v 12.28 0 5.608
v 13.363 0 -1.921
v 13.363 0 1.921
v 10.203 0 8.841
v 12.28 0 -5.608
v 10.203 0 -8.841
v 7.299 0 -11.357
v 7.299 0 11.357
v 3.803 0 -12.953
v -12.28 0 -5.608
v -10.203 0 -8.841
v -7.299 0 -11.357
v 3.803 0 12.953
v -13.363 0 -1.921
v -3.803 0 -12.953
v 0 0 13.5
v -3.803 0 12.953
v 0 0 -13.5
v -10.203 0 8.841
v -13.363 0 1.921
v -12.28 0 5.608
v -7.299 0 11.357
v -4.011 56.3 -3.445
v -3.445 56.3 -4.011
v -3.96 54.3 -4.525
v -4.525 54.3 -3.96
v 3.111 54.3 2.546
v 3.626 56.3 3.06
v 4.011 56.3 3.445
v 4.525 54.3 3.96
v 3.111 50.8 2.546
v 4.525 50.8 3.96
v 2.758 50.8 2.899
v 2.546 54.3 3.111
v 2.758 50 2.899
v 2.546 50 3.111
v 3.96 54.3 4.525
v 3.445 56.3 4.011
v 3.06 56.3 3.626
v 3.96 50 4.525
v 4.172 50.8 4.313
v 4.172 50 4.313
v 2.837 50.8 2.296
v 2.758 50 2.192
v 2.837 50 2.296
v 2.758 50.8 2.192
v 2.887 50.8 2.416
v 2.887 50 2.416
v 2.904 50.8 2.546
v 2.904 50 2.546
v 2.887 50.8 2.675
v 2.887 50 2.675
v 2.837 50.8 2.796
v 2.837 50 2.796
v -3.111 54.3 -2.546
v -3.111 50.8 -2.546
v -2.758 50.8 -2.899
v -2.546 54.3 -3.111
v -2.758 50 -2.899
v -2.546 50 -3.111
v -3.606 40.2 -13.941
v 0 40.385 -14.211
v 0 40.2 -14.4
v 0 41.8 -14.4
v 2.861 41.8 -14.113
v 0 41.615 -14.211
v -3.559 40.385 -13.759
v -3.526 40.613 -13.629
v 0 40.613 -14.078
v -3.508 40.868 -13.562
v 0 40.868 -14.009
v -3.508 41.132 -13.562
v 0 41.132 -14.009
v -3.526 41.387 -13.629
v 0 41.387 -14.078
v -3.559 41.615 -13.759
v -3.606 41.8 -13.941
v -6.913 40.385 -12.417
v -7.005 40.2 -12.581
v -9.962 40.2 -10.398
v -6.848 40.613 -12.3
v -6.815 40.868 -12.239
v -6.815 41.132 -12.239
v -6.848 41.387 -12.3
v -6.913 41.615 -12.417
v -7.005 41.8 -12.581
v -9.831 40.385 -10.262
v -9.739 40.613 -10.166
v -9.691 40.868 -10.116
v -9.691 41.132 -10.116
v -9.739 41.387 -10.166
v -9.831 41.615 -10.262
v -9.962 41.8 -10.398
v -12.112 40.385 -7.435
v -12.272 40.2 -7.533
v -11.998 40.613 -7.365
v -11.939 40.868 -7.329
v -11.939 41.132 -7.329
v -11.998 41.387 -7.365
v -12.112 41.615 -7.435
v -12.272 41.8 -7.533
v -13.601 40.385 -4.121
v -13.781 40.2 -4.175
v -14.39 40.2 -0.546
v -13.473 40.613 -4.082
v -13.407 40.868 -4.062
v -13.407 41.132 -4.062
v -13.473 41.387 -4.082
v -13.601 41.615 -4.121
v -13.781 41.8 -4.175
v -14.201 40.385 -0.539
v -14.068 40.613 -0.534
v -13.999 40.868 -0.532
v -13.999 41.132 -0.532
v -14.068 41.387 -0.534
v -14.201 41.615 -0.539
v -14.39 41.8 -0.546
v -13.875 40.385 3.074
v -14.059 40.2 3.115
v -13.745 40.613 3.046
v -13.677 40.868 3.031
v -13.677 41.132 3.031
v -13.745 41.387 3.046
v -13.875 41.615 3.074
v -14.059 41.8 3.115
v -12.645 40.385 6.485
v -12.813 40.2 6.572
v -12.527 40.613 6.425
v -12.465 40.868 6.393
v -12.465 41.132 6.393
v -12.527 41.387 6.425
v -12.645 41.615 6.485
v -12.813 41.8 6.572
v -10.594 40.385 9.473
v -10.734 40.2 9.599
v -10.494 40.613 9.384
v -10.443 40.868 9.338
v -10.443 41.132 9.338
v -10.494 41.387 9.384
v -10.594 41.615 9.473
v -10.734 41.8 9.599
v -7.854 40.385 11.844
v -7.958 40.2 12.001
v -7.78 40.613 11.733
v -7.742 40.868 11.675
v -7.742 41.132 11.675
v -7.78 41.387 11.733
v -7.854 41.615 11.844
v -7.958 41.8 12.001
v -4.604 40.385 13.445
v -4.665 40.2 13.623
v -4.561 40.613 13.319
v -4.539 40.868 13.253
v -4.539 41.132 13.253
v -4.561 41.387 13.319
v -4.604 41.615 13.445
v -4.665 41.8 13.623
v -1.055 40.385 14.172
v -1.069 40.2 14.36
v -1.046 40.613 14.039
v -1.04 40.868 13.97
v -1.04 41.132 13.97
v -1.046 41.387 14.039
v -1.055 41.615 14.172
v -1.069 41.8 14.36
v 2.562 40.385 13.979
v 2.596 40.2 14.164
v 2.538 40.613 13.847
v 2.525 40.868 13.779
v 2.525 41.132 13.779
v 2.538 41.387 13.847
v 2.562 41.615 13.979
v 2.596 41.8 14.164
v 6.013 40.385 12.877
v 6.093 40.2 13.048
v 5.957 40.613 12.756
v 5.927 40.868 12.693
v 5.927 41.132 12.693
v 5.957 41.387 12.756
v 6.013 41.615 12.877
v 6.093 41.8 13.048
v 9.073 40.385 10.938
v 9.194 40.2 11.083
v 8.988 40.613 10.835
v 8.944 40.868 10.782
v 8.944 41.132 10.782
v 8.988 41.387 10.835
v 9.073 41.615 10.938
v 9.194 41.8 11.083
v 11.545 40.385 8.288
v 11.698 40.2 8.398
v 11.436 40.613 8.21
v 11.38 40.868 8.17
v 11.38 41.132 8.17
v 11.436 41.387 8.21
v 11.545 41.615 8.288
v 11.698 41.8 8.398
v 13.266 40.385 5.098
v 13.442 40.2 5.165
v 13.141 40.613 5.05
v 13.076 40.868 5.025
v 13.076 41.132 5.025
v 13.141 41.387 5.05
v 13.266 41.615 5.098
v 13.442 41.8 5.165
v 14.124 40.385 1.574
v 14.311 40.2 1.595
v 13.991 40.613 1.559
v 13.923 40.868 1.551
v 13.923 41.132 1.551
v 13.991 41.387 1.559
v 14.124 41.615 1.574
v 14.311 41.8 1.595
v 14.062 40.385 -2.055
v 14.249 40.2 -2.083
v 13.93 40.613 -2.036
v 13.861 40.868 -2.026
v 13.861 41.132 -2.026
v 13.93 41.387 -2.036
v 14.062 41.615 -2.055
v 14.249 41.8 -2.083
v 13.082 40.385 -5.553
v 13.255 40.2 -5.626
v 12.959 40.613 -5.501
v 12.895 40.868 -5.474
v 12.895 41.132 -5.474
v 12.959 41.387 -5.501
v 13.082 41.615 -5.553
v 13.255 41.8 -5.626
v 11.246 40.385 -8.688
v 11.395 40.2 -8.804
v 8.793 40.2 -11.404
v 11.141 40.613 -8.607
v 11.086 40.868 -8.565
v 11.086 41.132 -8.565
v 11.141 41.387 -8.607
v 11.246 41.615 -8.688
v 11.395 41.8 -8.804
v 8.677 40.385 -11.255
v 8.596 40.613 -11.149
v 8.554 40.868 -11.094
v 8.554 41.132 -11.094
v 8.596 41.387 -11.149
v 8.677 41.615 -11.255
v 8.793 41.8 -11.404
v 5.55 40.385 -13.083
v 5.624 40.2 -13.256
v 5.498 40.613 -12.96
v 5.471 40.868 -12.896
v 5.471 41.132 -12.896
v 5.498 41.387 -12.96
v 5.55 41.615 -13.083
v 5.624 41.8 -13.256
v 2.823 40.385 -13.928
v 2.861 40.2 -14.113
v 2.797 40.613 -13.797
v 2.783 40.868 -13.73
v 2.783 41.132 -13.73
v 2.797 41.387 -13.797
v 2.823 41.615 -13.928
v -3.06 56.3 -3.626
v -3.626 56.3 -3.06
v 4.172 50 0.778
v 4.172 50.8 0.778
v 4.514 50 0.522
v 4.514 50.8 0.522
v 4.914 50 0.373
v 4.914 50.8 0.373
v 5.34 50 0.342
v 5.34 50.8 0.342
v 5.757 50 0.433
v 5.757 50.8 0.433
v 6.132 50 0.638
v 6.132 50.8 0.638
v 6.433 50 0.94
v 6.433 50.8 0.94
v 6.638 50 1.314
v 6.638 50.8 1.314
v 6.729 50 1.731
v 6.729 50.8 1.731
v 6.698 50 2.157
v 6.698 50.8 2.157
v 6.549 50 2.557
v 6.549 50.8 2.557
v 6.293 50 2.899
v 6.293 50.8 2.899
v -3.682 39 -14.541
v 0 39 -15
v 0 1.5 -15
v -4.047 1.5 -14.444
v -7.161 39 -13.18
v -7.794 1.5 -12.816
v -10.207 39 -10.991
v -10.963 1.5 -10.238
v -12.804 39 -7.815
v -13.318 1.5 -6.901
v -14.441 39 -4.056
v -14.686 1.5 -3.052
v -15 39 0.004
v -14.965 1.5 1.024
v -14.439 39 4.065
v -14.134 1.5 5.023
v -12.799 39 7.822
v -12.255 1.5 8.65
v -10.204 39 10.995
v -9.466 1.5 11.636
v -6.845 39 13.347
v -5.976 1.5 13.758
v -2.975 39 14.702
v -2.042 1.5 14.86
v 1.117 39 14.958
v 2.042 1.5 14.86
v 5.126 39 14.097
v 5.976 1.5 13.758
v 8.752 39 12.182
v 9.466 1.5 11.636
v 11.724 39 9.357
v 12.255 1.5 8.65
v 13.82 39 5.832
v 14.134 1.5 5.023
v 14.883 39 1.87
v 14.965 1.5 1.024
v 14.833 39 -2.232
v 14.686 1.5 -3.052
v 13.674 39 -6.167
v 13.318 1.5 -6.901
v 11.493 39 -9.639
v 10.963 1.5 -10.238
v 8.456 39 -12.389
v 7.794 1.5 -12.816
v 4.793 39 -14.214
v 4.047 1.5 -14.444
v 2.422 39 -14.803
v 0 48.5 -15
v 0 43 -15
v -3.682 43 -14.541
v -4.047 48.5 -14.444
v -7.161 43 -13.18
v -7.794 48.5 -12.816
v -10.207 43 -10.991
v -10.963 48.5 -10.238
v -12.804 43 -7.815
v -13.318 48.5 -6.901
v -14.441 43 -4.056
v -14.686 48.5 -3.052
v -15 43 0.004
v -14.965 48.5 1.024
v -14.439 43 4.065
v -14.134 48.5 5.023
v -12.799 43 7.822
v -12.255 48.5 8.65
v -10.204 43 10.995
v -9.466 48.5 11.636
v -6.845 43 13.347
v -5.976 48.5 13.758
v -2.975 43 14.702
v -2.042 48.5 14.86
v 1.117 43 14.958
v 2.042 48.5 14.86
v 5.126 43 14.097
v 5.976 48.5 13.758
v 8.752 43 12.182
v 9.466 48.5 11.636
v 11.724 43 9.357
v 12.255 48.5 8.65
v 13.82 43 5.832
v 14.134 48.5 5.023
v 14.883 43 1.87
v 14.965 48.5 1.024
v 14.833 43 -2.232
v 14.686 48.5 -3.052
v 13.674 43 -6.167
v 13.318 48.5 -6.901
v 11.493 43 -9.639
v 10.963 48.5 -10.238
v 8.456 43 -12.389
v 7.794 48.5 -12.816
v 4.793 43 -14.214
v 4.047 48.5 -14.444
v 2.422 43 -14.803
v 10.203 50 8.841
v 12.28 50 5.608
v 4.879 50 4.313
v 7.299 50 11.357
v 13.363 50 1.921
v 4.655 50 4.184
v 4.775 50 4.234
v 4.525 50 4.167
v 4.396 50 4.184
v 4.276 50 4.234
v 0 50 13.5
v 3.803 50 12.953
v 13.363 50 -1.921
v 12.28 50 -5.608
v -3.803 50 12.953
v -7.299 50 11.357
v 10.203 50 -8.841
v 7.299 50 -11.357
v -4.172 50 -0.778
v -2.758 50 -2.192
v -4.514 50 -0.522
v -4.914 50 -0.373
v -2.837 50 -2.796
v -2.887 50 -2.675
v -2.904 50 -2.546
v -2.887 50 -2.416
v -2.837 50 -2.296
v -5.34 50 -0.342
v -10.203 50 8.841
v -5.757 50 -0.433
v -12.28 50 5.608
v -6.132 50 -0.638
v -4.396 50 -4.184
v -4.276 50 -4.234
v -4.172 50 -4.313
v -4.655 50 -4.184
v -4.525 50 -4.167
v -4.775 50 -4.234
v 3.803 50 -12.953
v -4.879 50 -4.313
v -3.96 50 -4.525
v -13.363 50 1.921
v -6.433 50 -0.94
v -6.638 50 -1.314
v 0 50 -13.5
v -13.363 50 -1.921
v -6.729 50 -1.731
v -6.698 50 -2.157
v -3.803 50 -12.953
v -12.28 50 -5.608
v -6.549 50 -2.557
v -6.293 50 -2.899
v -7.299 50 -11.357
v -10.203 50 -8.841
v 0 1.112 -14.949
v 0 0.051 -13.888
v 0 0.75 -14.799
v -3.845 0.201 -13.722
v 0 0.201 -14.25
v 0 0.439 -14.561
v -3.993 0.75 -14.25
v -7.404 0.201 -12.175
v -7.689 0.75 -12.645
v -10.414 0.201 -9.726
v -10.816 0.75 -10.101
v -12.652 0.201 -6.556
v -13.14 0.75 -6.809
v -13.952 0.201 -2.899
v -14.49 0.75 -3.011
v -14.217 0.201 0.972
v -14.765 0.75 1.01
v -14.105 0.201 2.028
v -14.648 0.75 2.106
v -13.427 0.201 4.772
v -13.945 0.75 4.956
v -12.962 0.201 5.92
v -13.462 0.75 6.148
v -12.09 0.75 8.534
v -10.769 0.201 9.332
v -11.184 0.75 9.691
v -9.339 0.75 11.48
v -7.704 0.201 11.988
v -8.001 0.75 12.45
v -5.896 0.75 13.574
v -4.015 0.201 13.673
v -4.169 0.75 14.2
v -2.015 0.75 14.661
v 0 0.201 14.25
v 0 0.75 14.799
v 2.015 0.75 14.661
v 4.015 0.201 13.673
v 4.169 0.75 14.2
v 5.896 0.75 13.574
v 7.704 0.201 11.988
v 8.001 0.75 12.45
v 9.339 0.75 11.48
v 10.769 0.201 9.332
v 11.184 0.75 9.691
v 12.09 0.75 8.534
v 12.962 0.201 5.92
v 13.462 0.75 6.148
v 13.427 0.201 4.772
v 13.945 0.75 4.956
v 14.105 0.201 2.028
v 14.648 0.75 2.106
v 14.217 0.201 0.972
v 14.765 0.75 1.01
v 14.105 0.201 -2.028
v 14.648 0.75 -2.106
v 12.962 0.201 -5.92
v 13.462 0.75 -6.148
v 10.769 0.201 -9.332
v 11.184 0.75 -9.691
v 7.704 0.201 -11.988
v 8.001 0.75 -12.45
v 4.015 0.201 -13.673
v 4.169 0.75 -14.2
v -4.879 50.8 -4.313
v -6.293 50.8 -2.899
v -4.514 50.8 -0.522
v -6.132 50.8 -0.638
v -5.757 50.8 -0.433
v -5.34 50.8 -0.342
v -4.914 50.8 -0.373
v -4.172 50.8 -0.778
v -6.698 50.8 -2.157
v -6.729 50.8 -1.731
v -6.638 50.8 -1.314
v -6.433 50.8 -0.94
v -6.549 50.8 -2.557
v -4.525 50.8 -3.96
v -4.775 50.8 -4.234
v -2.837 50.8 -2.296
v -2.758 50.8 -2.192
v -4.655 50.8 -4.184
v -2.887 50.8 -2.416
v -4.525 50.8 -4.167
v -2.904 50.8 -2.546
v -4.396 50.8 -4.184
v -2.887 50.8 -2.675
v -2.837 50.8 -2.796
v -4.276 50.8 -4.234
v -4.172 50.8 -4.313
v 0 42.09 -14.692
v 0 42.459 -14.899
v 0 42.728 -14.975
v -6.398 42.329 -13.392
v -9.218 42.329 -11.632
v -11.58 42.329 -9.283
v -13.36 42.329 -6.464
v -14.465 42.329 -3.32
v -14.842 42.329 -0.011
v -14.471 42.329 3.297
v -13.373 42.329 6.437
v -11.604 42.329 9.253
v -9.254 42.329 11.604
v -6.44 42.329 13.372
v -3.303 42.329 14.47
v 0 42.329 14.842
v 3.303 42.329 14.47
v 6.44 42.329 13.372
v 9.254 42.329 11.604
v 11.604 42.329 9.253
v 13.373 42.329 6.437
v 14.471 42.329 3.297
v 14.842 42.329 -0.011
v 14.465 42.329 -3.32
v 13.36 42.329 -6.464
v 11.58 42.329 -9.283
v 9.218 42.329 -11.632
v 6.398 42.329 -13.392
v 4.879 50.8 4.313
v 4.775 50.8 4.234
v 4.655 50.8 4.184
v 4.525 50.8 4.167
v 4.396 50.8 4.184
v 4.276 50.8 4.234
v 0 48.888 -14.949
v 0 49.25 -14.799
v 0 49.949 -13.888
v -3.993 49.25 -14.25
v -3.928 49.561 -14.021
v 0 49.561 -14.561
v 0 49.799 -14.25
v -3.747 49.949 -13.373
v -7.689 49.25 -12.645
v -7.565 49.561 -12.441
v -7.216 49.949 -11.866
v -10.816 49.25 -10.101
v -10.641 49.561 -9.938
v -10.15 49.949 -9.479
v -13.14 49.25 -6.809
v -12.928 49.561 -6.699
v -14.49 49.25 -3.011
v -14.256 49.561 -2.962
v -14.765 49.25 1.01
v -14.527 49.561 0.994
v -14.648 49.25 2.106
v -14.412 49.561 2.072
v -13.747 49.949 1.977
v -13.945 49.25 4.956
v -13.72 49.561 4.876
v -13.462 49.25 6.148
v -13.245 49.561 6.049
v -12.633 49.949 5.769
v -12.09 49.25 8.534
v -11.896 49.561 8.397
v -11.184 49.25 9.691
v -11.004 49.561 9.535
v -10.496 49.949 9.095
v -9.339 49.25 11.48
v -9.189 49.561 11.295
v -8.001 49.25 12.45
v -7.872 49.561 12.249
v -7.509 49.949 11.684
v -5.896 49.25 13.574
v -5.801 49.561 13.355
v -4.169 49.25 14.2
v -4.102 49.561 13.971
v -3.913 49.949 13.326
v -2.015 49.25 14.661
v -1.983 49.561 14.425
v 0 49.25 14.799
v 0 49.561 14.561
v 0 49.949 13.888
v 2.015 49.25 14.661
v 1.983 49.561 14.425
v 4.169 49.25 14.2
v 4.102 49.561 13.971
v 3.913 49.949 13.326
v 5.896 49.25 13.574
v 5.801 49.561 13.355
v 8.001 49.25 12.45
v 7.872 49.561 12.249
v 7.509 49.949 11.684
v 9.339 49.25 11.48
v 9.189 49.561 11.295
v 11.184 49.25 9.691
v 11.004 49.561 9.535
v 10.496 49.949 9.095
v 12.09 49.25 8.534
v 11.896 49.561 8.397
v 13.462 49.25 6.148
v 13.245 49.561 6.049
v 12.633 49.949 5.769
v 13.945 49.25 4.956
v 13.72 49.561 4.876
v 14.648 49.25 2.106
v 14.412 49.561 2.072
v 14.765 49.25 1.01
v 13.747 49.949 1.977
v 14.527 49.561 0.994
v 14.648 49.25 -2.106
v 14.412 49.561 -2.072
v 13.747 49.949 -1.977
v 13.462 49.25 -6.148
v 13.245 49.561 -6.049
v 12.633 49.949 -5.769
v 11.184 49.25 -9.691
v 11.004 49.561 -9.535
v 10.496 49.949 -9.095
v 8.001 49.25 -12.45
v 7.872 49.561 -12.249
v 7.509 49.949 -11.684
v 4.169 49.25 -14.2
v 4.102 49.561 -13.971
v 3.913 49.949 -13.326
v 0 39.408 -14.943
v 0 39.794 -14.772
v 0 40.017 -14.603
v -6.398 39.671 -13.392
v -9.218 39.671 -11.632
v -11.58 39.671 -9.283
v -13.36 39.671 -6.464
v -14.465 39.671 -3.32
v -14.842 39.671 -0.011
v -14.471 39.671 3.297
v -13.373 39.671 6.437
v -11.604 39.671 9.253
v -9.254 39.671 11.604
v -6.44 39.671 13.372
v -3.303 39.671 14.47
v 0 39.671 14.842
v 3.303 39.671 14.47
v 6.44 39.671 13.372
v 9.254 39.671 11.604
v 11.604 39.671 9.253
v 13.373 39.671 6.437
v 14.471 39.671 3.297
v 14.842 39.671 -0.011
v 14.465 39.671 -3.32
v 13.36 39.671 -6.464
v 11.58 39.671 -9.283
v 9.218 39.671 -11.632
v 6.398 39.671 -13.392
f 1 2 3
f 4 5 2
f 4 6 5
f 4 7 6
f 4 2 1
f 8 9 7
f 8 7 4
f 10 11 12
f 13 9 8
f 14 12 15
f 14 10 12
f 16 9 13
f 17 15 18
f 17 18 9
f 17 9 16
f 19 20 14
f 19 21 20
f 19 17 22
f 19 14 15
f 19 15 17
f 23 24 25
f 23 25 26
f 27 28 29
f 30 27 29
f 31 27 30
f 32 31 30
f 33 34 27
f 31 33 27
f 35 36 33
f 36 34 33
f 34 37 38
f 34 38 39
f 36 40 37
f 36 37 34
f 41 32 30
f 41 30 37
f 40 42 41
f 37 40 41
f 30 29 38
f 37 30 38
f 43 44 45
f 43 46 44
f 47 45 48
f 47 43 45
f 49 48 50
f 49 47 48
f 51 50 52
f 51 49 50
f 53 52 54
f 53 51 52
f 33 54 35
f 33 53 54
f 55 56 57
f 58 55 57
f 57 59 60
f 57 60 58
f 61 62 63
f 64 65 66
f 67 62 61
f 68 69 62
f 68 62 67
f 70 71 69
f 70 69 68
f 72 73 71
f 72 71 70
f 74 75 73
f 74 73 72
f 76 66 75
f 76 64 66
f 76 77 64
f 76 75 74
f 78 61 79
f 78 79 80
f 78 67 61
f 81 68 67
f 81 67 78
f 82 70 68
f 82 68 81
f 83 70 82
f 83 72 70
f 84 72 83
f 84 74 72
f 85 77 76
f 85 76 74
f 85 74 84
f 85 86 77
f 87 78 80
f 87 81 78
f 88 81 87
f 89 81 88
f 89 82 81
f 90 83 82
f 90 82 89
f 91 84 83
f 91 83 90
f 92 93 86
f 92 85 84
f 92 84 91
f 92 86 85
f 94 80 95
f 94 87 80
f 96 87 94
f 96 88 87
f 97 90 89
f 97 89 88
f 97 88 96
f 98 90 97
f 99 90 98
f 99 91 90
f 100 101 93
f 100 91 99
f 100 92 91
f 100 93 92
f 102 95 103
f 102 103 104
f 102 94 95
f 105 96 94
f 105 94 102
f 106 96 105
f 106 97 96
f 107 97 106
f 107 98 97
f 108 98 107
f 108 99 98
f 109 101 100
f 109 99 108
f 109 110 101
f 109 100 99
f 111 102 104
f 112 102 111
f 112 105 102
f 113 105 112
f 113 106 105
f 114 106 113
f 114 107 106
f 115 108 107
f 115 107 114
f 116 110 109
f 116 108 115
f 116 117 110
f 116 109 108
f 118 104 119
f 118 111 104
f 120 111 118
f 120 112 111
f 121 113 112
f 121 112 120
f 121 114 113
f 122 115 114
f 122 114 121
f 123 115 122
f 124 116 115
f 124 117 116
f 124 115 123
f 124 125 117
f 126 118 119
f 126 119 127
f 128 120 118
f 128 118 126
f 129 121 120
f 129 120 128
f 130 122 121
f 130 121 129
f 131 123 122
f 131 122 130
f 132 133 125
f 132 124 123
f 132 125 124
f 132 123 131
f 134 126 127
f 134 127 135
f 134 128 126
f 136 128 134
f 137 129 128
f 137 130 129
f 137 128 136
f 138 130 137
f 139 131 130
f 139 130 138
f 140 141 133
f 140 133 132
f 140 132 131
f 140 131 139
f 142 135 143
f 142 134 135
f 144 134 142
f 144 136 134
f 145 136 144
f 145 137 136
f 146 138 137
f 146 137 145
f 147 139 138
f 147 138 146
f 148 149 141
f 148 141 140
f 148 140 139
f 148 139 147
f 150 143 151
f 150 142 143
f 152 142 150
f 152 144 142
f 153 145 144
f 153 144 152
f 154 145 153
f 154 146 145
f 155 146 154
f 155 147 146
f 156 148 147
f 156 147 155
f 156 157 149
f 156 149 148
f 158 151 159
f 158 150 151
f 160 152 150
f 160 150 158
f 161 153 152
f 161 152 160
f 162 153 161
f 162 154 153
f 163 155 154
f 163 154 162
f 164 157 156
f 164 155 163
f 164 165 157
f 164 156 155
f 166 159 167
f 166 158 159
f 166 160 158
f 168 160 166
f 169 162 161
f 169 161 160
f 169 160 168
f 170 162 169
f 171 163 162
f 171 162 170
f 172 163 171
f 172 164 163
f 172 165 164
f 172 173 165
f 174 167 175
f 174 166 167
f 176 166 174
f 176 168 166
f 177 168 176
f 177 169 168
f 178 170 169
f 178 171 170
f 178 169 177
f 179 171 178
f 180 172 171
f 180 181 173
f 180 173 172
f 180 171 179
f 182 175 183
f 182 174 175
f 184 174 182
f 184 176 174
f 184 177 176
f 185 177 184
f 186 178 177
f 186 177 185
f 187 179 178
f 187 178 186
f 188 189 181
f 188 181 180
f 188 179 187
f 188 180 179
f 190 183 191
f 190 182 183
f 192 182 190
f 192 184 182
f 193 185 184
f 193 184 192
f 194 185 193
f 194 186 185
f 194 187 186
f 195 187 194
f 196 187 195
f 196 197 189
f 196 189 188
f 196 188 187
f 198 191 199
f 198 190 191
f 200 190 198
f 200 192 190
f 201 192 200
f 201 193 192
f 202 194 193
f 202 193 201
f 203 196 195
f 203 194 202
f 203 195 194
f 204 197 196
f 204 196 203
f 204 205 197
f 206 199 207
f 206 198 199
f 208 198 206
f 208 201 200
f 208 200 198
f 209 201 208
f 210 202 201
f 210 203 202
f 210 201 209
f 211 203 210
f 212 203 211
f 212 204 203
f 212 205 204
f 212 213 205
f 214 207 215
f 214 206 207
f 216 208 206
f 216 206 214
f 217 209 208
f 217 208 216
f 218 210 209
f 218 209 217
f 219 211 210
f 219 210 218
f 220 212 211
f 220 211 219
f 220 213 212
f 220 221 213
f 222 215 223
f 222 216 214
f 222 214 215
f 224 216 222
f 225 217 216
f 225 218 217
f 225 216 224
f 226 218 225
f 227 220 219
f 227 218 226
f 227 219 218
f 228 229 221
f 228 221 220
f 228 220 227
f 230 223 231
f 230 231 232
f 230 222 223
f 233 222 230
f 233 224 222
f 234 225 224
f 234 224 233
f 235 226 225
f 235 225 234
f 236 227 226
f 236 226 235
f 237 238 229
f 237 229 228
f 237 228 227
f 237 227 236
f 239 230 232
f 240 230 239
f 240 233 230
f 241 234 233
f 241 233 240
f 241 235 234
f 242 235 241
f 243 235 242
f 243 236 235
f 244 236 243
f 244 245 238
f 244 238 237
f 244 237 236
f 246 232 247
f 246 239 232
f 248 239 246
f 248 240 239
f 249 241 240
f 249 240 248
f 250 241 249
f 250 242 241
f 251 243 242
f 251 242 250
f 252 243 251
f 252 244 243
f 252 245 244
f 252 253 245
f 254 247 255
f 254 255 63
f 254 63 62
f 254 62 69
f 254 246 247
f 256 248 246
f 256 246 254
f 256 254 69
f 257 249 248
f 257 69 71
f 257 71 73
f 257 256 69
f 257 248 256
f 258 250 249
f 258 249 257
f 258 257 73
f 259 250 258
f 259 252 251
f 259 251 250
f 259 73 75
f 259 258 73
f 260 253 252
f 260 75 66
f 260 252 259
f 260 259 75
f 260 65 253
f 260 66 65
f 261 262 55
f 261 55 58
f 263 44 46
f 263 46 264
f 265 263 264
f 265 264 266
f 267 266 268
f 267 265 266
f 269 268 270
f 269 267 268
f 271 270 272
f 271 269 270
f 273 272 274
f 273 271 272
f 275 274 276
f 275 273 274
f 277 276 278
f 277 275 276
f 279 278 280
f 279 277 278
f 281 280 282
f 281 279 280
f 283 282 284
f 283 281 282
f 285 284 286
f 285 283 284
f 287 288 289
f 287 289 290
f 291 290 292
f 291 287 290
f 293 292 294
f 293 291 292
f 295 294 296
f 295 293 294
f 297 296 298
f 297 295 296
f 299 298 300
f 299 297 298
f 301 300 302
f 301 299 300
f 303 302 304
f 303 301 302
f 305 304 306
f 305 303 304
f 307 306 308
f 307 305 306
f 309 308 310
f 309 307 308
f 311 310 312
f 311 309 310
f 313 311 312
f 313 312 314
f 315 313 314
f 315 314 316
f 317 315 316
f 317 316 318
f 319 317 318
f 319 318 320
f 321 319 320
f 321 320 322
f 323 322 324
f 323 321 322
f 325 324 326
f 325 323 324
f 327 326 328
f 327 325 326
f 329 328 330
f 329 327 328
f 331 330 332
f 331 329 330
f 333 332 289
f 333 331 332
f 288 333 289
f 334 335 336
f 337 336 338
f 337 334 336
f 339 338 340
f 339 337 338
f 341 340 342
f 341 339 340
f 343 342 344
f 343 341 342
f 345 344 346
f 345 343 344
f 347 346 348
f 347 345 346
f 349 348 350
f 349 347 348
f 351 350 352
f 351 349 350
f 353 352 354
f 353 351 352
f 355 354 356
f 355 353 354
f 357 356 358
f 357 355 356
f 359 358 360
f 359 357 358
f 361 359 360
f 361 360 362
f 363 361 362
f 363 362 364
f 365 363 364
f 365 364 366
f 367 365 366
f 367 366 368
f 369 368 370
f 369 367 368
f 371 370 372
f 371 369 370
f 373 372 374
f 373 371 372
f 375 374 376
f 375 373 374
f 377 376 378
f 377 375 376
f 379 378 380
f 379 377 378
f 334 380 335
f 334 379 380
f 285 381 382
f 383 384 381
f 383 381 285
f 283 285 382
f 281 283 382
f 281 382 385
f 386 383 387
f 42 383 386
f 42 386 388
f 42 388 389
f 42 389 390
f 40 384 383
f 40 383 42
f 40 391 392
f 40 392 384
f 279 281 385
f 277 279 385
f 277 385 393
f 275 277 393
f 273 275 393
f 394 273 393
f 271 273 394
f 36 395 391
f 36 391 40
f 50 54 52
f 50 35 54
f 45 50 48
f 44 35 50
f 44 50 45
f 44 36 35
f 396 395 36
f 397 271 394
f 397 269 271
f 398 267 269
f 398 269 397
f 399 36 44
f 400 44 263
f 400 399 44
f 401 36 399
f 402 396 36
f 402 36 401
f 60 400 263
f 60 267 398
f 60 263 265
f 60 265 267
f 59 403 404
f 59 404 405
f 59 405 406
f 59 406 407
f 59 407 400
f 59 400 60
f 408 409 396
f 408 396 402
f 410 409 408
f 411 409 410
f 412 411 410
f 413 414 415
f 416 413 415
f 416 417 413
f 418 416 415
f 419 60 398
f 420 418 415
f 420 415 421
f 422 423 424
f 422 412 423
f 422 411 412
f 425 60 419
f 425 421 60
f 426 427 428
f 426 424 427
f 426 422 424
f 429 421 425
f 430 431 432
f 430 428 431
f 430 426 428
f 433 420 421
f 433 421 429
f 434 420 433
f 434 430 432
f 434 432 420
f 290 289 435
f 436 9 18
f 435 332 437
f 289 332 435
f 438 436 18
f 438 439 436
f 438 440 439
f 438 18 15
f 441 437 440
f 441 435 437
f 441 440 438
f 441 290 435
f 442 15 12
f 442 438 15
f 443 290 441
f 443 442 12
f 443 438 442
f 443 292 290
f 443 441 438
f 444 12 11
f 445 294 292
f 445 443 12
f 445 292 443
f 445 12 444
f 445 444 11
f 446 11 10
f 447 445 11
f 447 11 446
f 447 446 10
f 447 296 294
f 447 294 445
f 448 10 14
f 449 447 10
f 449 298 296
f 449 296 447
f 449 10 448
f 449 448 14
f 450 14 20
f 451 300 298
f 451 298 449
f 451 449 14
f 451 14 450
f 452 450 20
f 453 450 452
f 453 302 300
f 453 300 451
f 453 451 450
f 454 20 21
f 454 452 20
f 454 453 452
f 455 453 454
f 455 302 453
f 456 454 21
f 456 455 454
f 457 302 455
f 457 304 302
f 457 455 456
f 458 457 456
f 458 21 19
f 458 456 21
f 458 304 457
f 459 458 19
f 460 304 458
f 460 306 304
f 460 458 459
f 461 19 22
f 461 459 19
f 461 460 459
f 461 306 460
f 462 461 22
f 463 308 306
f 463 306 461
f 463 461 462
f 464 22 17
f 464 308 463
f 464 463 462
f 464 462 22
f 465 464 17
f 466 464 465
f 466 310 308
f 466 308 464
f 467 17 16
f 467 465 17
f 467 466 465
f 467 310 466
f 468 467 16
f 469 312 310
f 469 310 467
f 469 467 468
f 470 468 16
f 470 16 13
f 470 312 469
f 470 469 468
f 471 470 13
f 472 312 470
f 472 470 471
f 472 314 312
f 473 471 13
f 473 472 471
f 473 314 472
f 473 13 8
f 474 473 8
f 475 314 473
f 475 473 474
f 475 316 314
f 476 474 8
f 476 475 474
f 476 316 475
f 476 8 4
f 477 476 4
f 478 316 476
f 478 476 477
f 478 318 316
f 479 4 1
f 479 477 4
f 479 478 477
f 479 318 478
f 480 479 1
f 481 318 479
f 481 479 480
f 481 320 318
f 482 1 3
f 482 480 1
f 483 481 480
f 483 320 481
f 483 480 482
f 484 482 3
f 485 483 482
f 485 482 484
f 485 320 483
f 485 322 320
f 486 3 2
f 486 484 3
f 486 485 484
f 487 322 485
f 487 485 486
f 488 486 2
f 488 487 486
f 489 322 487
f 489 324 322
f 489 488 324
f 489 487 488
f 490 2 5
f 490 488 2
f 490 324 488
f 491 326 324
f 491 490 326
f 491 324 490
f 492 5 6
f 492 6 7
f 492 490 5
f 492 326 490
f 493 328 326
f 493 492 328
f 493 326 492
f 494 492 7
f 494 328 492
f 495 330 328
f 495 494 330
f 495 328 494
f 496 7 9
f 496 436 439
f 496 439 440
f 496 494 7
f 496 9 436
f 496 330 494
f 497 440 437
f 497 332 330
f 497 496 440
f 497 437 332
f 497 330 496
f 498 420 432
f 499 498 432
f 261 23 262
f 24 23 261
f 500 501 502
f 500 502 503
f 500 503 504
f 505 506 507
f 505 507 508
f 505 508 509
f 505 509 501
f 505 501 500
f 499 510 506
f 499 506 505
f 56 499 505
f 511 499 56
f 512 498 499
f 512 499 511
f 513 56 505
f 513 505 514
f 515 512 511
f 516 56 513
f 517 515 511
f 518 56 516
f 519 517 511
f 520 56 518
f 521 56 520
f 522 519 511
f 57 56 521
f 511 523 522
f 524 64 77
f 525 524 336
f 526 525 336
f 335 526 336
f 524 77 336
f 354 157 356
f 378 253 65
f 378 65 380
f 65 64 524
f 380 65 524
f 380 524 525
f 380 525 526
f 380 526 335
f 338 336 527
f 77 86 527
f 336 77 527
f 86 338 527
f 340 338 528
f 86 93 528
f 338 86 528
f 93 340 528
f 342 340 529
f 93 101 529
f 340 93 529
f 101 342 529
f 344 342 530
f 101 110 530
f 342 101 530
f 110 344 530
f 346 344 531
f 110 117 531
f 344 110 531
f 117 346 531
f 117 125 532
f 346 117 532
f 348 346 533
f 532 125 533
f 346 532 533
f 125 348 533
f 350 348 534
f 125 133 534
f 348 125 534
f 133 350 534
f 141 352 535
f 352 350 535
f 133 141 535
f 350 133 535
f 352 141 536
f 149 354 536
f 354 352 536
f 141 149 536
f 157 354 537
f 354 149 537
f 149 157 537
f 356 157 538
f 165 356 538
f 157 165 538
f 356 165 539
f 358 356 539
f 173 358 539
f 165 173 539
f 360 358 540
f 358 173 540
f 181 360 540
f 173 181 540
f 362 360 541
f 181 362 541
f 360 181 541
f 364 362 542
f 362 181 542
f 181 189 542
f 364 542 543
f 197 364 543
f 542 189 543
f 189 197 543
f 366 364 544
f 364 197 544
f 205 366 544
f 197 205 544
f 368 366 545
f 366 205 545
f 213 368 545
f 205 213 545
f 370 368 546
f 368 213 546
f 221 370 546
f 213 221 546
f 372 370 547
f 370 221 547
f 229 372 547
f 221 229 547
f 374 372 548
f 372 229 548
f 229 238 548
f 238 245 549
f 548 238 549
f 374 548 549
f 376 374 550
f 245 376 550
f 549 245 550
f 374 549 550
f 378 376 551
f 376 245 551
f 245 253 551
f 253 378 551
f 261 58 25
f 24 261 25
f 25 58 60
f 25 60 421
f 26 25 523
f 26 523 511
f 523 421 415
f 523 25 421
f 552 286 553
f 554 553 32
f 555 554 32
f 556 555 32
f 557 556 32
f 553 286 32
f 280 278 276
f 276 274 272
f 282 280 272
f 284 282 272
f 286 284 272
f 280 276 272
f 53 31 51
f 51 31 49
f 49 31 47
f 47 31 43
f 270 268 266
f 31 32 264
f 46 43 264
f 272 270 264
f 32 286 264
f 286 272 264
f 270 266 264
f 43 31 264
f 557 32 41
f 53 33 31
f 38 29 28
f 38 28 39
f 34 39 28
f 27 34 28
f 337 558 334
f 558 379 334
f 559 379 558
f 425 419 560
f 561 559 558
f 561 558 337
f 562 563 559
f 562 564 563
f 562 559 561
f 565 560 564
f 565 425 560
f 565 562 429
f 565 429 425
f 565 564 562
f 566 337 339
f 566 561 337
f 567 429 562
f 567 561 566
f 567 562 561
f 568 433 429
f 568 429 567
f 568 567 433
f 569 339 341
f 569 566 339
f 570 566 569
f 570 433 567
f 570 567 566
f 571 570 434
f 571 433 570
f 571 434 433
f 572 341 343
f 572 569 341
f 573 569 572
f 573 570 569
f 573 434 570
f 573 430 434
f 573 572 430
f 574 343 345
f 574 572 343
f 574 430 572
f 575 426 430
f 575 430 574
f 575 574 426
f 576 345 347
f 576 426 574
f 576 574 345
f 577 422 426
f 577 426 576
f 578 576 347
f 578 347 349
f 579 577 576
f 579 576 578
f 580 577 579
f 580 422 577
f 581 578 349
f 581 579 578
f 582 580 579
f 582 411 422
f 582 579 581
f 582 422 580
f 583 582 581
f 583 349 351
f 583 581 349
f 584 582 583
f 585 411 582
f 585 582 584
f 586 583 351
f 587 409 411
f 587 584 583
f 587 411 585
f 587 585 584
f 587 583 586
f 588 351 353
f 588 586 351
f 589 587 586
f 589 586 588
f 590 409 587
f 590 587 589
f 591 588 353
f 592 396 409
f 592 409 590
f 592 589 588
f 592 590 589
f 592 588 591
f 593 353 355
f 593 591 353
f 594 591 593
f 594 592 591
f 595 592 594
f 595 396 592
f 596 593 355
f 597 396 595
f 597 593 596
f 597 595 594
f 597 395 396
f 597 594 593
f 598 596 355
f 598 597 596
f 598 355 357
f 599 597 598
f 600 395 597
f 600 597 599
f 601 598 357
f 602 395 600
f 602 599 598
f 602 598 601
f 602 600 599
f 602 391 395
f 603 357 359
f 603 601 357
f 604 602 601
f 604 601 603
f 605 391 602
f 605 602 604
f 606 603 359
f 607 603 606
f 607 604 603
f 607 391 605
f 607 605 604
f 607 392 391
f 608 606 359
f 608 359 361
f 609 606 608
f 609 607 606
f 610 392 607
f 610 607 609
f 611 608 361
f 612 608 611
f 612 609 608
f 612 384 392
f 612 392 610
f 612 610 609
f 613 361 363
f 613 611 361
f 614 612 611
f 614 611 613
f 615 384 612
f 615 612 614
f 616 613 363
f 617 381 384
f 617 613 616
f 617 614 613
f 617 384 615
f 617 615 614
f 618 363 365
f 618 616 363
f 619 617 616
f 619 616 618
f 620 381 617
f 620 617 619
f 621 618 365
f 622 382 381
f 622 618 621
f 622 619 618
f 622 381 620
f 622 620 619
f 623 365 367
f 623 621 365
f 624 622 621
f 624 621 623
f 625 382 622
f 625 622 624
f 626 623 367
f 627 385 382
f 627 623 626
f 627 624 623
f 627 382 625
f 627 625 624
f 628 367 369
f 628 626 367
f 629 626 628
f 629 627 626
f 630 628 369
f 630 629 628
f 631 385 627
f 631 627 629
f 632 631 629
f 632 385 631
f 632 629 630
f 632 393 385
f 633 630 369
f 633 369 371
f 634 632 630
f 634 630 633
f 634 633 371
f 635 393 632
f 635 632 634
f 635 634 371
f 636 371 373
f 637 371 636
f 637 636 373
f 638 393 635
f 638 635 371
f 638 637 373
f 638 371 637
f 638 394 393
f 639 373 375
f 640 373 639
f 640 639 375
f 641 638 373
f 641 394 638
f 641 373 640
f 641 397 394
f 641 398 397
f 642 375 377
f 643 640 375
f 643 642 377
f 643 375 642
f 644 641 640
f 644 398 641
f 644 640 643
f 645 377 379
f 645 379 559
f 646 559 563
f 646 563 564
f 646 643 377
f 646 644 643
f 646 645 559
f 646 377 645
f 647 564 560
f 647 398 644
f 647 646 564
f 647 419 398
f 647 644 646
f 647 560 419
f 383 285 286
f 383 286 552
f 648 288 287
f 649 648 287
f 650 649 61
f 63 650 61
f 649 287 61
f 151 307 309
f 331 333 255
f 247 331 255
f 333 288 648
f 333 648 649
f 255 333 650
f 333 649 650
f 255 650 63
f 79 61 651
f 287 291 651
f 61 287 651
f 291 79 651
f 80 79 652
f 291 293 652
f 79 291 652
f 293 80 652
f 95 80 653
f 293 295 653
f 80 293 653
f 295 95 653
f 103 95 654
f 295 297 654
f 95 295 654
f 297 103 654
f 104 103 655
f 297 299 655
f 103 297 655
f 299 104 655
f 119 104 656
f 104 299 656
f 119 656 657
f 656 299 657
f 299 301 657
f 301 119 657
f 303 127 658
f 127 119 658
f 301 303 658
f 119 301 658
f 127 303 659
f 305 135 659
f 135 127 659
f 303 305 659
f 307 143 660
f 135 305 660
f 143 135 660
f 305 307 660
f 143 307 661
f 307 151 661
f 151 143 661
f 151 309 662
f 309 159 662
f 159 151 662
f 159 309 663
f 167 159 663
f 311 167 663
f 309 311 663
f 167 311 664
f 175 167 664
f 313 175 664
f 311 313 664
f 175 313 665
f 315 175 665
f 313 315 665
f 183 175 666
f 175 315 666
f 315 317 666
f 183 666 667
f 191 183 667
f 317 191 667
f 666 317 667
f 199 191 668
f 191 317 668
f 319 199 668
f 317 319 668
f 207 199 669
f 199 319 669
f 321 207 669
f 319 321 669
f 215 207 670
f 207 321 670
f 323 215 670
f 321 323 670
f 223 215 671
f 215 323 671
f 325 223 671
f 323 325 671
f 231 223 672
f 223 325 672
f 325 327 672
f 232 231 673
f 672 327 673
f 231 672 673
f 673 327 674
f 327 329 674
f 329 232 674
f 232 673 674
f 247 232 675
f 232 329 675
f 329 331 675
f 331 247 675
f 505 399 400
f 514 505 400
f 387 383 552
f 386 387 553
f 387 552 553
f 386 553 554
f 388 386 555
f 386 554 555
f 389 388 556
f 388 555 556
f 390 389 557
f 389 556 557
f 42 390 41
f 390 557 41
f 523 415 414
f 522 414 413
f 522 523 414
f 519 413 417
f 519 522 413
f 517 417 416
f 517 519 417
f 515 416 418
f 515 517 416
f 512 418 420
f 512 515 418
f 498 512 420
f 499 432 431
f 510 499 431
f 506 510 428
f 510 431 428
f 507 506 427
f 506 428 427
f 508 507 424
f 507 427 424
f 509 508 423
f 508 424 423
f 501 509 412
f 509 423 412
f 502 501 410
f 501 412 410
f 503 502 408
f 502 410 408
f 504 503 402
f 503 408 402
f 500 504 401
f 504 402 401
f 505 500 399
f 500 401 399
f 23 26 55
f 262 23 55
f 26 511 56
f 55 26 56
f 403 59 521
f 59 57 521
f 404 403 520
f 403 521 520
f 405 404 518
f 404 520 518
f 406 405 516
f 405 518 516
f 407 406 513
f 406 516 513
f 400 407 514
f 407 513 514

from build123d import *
from OCP.BRepFilletAPI import BRepFilletAPI_MakeChamfer

# Parameters (mm, degrees)
FILLET_1_R      = 1.5
EXTRUDE_4_DEPTH = 6.3
EXTRUDE_5_DEPTH = 0.8
CHAMFER_2_SIZE  = 2
CHAMFER_2_SIZE2 = 0.727940469
FILLET_4_R      = 0.5


with BuildPart() as part:
    # Эскиз2 → Повернуть1 (revolve)
    with BuildSketch(Plane.XY, mode=Mode.PRIVATE) as revolve_1_sk:
        with BuildLine():
            Line((0, 0), (-15, 0))
            Line((-15, 0), (-15, 40))
            ThreePointArc((-15, 40), (-14, 41), (-15, 42))
            Line((-15, 42), (-15, 50))
            Line((-15, 50), (0, 50))
            Line((0, 50), (0, 0))
        make_face()
    revolve(revolve_1_sk.sketch.rotate(Axis((0, 0, 0), (0, 1, 0)), 270), axis=Axis((0, 0, 0), (0, 1, 0)))

    # Скругление1
    fillet_1_edges = [part.edges().sort_by_distance(p)[0] for p in [
        (0, 0, 15),
        (0, 40, 15),
        (0, 42, 15),
        (0, 50, 15),
    ]]
    fillet(fillet_1_edges, radius=FILLET_1_R)

    # Эскиз3 → Бобышка-Вытянуть4 (add)
    with BuildSketch(Plane(origin=(0, 50, 0), x_dir=(1, 0, 0), z_dir=(0, 1, 0))):
        Polygon((-4.5254834, 3.959797975), (-3.111269837, 2.545584412), (-2.545584412, 3.111269837), (-3.959797975, 4.5254834), align=None)
        Polygon((3.959797975, -4.5254834), (2.545584412, -3.111269837), (3.111269837, -2.545584412), (4.5254834, -3.959797975), align=None)
    extrude(amount=EXTRUDE_4_DEPTH)

    # Эскиз5 → Бобышка-Вытянуть5 (add)
    with BuildSketch(Plane(origin=(0, 50, 0), x_dir=(1, 0, 0), z_dir=(0, 1, 0))):
        with BuildLine():
            Line((-2.757716447, 2.192031022), (-4.87903679, 4.313351365))
            Line((-4.87903679, 4.313351365), (-6.293250353, 2.899137803))
            ThreePointArc((-6.293250353, 2.899137803), (-6.293250353, 0.777817459), (-4.171930009, 0.777817459))
            Line((-4.171930009, 0.777817459), (-2.757716447, 2.192031022))
        make_face()
        with BuildLine():
            Line((4.87903679, -4.313351365), (2.757716447, -2.192031022))
            Line((2.757716447, -2.192031022), (4.171930009, -0.777817459))
            ThreePointArc((4.171930009, -0.777817459), (6.293250353, -0.777817459), (6.293250353, -2.899137803))
            Line((6.293250353, -2.899137803), (4.87903679, -4.313351365))
        make_face()
    extrude(amount=EXTRUDE_5_DEPTH)

    # Фаска2: one chamfer whose edges measure the first distance from different faces: ONE call of the kernel's chamfer builder (chamfer() names one face for all edges)
    chamfer_2_edges_1 = [part.edges().sort_by_distance(p)[0] for p in [
        (-4.242640687, 56.3, -4.242640687),
    ]]
    chamfer_2_side_1 = [part.faces().sort_by_distance(p)[0] for p in [
        (-4.242640687, 53.15, -4.242640687),
    ]]
    chamfer_2_edges_2 = [part.edges().sort_by_distance(p)[0] for p in [
        (-2.828427125, 56.3, -2.828427125),
    ]]
    chamfer_2_side_2 = [part.faces().sort_by_distance(p)[0] for p in [
        (-2.828427125, 53.15, -2.828427125),
    ]]
    chamfer_2_edges_3 = [part.edges().sort_by_distance(p)[0] for p in [
        (4.242640687, 56.3, 4.242640687),
    ]]
    chamfer_2_side_3 = [part.faces().sort_by_distance(p)[0] for p in [
        (4.242640687, 53.15, 4.242640687),
    ]]
    chamfer_2_edges_4 = [part.edges().sort_by_distance(p)[0] for p in [
        (2.828427125, 56.3, 2.828427125),
    ]]
    chamfer_2_side_4 = [part.faces().sort_by_distance(p)[0] for p in [
        (2.828427125, 53.15, 2.828427125),
    ]]
    chamfer_2 = BRepFilletAPI_MakeChamfer(part.part.solid().wrapped)
    for e in chamfer_2_edges_1:
        chamfer_2.Add(CHAMFER_2_SIZE, CHAMFER_2_SIZE2, e.wrapped, chamfer_2_side_1[0].wrapped)  # the first distance lies on this face
    for e in chamfer_2_edges_2:
        chamfer_2.Add(CHAMFER_2_SIZE, CHAMFER_2_SIZE2, e.wrapped, chamfer_2_side_2[0].wrapped)  # the first distance lies on this face
    for e in chamfer_2_edges_3:
        chamfer_2.Add(CHAMFER_2_SIZE, CHAMFER_2_SIZE2, e.wrapped, chamfer_2_side_3[0].wrapped)  # the first distance lies on this face
    for e in chamfer_2_edges_4:
        chamfer_2.Add(CHAMFER_2_SIZE, CHAMFER_2_SIZE2, e.wrapped, chamfer_2_side_4[0].wrapped)  # the first distance lies on this face
    add(Compound.cast(chamfer_2.Shape()), mode=Mode.REPLACE)

    # Скругление4
    fillet_4_edges = [part.edges().sort_by_distance(p)[0] for p in [
        (3.111269837, 50.4, 2.545584412),
        (4.5254834, 50.4, 3.959797975),
        (-4.5254834, 50.4, -3.959797975),
        (-3.111269837, 50.4, -2.545584412),
    ]]
    fillet(fillet_4_edges, radius=FILLET_4_R - 0.0001)  # a hair under: the kernel refuses the full size


solid = part.part
